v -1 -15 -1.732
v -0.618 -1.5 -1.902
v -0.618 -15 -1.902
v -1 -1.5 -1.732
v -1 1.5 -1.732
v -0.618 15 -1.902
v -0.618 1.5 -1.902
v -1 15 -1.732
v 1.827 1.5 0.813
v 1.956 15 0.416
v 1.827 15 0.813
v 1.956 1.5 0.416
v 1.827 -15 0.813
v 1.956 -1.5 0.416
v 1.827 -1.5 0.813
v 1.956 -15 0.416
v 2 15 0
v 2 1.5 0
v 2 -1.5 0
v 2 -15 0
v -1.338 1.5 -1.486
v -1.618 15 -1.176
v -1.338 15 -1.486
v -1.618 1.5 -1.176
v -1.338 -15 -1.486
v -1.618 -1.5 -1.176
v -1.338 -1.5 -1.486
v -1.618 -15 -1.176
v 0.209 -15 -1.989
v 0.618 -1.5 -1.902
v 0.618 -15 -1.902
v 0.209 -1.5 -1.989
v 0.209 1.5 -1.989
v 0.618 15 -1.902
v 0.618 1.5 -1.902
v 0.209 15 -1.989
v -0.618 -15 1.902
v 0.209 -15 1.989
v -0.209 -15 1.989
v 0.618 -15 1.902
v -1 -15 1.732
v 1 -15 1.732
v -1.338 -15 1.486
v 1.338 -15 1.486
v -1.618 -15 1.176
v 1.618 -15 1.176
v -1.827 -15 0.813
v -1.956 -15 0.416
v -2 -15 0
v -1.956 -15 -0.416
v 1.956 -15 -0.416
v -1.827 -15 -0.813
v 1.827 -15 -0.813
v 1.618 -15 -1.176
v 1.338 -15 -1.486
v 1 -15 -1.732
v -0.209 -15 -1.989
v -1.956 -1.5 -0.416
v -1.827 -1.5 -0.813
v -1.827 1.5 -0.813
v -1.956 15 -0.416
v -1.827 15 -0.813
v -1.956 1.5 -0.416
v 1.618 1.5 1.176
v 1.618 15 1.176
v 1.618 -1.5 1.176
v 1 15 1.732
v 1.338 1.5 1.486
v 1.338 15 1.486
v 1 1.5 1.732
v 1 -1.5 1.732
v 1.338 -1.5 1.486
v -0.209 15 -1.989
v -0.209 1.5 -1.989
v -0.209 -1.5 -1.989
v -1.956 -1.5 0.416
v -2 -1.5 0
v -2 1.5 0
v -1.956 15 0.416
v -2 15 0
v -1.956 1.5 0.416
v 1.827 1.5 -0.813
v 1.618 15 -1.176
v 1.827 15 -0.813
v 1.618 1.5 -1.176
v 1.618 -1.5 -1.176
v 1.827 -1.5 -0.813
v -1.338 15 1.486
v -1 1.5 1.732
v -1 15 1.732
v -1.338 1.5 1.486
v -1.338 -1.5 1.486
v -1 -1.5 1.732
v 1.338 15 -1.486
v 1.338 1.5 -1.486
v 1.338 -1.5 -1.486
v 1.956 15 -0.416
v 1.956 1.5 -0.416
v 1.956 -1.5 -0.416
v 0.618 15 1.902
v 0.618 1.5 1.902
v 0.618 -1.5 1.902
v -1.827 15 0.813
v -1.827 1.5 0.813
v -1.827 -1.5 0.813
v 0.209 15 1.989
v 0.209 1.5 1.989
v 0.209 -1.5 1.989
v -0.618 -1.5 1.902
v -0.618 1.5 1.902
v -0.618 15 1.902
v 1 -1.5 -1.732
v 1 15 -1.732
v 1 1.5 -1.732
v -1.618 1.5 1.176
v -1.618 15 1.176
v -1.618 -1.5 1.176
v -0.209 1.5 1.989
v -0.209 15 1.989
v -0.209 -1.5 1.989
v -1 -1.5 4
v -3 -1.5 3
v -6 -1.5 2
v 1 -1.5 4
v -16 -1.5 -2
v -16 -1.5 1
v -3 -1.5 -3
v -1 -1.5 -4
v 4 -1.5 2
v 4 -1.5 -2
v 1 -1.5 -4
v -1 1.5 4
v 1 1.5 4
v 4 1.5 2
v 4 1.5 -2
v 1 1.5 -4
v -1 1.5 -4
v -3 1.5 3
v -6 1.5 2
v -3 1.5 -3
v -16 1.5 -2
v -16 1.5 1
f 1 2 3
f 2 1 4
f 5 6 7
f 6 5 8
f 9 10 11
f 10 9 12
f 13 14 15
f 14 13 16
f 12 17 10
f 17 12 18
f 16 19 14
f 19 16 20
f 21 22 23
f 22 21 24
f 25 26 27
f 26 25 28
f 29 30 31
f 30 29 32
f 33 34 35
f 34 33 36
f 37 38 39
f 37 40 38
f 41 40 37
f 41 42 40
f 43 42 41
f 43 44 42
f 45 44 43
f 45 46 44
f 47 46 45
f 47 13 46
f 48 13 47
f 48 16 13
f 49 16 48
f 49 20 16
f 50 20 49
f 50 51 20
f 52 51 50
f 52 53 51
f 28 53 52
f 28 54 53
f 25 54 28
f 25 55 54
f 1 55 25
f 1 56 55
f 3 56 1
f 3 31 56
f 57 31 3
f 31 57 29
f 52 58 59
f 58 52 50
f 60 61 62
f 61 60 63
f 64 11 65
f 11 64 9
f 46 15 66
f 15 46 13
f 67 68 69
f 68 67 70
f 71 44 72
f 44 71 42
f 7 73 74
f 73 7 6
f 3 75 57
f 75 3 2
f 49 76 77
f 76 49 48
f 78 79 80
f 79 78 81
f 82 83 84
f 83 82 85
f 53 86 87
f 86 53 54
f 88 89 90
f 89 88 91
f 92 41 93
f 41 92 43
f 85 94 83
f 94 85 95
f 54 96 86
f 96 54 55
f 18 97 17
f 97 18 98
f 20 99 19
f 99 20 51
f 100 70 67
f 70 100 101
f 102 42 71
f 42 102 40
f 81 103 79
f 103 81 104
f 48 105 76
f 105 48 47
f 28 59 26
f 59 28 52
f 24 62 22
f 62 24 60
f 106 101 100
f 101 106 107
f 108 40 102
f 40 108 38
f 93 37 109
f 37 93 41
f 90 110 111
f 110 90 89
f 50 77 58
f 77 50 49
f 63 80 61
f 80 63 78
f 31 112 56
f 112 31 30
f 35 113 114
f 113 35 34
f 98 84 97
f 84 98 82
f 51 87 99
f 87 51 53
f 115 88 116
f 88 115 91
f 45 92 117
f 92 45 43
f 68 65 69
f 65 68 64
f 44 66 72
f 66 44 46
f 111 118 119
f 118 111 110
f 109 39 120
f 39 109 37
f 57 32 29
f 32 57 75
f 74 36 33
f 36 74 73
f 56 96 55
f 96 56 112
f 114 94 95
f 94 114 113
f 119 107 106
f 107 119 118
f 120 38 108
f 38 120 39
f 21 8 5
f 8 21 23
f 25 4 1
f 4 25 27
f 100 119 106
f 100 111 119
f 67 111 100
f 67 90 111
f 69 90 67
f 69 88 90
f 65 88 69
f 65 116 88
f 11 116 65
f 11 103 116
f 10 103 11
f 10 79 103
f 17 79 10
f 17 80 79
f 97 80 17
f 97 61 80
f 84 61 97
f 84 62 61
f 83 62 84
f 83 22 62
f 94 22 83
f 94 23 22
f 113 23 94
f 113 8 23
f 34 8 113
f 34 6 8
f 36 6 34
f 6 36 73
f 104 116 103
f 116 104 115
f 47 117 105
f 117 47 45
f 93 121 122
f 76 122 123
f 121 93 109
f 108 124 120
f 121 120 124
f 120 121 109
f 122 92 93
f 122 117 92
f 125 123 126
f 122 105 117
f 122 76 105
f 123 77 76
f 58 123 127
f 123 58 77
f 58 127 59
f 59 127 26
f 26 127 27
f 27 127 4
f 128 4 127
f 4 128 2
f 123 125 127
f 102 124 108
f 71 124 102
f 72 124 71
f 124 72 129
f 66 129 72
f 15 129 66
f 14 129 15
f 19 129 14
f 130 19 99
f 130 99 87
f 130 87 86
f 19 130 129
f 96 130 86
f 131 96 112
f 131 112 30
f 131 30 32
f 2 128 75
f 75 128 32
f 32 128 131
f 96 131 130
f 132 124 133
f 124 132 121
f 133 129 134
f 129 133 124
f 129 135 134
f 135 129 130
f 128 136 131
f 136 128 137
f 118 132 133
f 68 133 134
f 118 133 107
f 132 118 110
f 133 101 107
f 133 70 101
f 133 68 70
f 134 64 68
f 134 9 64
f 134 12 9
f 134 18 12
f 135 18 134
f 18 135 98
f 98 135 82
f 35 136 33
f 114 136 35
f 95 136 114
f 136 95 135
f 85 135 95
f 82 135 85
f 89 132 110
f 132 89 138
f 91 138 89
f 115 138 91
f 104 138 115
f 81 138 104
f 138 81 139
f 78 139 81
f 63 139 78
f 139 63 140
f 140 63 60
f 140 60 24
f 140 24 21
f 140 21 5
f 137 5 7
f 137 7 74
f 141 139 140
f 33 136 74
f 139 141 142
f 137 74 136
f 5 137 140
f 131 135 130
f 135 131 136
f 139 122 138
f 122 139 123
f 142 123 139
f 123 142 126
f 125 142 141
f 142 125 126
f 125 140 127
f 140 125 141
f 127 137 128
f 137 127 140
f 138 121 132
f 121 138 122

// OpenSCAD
color("white")
   rotate([90,0,0])  
   translate([0,0,0])
   cylinder(30,2,2, $fn = 30, center = true); 
  
 

 
color("gray")
translate([-1,0,-1])
rotate([90,0,0])
linear_extrude(3, scale = 1, center = true)
polygon(points=[[0,-3],[2,-3],[5,-1],[5,0],[5,3],[2,5],[0,5]]);



color("gray")
translate([-1,0,1])
rotate([90,180,0])
linear_extrude(3, scale = 1, center = true)
polygon(points=[[0,-3],[2,-2],[5,-1],[15,0],[15,3],[2,4],[0,5]]);
